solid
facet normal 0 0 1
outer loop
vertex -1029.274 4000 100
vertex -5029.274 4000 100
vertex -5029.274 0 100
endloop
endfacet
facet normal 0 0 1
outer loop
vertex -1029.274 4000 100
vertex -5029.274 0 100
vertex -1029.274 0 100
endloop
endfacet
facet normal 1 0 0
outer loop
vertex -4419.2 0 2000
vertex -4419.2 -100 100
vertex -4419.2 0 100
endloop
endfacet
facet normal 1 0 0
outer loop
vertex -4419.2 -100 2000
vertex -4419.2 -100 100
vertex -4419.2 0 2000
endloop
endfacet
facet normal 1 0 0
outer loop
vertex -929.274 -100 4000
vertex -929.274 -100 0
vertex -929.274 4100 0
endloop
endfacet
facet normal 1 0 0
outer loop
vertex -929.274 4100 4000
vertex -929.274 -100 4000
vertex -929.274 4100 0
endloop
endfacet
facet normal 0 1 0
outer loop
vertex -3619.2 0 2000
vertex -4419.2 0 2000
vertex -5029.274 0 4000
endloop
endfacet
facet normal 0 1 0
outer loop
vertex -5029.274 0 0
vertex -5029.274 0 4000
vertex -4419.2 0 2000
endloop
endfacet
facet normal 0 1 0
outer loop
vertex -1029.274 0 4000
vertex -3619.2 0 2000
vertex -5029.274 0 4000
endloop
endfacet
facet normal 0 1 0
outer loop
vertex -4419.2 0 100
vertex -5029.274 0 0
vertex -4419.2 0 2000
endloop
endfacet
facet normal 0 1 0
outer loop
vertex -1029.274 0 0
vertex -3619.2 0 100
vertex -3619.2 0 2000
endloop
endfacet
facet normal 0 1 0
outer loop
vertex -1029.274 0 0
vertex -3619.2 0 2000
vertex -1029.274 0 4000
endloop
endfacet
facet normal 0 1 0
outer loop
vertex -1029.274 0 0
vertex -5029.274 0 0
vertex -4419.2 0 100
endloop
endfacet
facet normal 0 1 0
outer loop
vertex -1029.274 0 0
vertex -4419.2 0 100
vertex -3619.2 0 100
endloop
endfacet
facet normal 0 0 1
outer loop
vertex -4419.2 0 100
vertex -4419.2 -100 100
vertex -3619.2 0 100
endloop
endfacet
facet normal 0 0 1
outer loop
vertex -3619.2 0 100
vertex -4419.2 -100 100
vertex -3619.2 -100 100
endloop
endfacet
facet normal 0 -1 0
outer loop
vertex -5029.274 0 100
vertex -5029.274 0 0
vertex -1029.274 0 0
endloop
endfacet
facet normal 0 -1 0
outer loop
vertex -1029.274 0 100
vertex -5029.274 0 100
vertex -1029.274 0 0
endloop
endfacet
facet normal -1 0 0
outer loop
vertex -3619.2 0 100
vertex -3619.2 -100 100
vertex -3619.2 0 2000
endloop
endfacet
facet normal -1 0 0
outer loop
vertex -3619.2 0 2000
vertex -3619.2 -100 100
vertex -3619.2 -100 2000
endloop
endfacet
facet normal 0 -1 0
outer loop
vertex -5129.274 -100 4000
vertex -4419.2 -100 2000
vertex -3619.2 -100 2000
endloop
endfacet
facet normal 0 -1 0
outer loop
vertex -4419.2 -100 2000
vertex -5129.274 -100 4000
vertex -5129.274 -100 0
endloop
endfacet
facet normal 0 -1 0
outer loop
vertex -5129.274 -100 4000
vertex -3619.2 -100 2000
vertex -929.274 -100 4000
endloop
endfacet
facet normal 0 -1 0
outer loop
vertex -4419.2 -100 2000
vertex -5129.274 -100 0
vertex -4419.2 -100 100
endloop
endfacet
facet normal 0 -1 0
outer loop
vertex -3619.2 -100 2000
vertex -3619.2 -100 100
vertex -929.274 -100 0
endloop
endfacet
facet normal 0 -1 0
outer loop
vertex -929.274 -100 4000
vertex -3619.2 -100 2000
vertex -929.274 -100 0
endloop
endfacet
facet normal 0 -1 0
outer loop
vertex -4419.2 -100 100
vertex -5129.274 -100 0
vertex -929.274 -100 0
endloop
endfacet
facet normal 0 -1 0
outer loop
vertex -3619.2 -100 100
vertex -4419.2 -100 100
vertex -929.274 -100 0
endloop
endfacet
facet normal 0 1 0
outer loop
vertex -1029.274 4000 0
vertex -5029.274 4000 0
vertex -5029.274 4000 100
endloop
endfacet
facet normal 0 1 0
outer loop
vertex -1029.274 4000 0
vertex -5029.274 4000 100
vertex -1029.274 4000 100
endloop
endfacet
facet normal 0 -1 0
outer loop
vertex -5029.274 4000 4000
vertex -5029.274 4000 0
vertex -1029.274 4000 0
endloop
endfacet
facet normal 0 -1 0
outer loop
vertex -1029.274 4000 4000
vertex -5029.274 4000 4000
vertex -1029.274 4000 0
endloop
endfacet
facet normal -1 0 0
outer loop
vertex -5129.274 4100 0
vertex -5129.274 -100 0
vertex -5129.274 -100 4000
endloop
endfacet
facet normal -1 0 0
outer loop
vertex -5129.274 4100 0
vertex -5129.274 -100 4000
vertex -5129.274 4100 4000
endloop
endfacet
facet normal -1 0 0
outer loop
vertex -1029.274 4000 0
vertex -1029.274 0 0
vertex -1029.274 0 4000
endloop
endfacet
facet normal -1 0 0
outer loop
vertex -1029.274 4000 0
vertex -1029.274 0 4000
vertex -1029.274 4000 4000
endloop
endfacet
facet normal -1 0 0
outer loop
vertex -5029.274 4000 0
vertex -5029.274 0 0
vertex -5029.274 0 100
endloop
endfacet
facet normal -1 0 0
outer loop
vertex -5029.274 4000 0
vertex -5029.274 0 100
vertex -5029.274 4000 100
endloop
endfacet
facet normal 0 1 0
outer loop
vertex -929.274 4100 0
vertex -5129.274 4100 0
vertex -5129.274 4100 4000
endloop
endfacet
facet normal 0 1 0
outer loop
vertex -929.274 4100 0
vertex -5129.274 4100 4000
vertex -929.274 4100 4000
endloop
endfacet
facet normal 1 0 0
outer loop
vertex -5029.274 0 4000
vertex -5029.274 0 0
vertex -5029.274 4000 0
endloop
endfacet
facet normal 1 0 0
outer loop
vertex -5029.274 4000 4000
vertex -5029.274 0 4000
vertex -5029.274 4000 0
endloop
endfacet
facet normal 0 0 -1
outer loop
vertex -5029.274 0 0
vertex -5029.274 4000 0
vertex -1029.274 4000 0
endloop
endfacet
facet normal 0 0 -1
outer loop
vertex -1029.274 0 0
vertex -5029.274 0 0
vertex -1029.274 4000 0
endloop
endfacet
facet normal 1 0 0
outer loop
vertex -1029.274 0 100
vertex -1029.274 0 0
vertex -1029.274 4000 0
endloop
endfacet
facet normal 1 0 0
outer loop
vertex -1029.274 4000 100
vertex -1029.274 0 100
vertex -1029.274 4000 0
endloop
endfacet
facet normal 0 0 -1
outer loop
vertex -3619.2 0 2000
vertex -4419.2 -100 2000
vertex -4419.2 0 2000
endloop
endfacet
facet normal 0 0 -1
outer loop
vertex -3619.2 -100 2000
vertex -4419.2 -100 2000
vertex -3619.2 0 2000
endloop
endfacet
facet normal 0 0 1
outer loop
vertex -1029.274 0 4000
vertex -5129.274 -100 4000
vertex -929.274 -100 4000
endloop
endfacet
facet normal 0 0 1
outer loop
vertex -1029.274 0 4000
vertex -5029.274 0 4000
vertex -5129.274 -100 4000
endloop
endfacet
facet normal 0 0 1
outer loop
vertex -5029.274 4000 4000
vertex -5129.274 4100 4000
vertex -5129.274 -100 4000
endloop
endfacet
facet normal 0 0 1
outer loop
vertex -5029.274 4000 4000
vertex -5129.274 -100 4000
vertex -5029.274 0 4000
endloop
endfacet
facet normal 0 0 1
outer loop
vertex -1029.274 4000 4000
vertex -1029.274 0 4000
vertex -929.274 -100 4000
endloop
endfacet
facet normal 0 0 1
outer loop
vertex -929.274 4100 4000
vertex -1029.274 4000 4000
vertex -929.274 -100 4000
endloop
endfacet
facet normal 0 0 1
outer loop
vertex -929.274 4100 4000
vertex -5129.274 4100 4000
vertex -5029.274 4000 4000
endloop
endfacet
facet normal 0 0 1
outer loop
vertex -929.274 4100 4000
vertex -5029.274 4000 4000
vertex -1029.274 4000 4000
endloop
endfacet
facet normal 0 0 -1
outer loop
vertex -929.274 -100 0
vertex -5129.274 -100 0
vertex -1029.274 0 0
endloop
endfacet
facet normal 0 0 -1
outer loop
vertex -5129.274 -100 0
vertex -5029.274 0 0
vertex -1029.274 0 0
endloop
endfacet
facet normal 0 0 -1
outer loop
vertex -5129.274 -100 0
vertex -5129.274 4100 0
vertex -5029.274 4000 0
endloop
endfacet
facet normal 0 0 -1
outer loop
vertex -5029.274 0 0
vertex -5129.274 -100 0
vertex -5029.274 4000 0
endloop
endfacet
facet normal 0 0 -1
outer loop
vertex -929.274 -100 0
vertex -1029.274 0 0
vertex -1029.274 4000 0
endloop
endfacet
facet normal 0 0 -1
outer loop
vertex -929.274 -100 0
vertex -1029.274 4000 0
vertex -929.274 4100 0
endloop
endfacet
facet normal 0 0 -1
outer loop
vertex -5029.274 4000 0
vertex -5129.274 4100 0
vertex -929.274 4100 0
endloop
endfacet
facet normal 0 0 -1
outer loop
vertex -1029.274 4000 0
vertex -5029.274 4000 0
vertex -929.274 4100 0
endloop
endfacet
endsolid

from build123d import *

# Parameters (mm, degrees)
F0_W     = 4200
F0_H     = 4200
F0_W_2   = 4000
F0_H_2   = 4000
F1_DEPTH = 4000
F2_DEPTH = 100
F3_W     = 800
F3_H     = 1900
F4_DEPTH = 100


with BuildPart() as f1:
    # F0 (on Top) → F1 (new body)
    with BuildSketch(Plane.XY):
        with Locations((-3029.274268, 2000)):
            Rectangle(F0_W, F0_H)
        with Locations((-3029.274268, 2000)):
            Rectangle(F0_W_2, F0_H_2, mode=Mode.SUBTRACT)
    extrude(amount=F1_DEPTH)

    # F3 (on face) → F4 (cut)
    with BuildSketch(Plane.XZ.offset(100)):
        with Locations((-4019.199653, 1050)):
            Rectangle(F3_W, F3_H)
    extrude(amount=-F4_DEPTH, mode=Mode.SUBTRACT)


with BuildPart() as f2:
    # F0 (on Top) → F2 (new body)
    with BuildSketch(Plane.XY):
        with Locations((-3029.274268, 2000)):
            Rectangle(F0_W_2, F0_H_2)
    extrude(amount=F2_DEPTH)


solid = Compound([f1.part, f2.part])
